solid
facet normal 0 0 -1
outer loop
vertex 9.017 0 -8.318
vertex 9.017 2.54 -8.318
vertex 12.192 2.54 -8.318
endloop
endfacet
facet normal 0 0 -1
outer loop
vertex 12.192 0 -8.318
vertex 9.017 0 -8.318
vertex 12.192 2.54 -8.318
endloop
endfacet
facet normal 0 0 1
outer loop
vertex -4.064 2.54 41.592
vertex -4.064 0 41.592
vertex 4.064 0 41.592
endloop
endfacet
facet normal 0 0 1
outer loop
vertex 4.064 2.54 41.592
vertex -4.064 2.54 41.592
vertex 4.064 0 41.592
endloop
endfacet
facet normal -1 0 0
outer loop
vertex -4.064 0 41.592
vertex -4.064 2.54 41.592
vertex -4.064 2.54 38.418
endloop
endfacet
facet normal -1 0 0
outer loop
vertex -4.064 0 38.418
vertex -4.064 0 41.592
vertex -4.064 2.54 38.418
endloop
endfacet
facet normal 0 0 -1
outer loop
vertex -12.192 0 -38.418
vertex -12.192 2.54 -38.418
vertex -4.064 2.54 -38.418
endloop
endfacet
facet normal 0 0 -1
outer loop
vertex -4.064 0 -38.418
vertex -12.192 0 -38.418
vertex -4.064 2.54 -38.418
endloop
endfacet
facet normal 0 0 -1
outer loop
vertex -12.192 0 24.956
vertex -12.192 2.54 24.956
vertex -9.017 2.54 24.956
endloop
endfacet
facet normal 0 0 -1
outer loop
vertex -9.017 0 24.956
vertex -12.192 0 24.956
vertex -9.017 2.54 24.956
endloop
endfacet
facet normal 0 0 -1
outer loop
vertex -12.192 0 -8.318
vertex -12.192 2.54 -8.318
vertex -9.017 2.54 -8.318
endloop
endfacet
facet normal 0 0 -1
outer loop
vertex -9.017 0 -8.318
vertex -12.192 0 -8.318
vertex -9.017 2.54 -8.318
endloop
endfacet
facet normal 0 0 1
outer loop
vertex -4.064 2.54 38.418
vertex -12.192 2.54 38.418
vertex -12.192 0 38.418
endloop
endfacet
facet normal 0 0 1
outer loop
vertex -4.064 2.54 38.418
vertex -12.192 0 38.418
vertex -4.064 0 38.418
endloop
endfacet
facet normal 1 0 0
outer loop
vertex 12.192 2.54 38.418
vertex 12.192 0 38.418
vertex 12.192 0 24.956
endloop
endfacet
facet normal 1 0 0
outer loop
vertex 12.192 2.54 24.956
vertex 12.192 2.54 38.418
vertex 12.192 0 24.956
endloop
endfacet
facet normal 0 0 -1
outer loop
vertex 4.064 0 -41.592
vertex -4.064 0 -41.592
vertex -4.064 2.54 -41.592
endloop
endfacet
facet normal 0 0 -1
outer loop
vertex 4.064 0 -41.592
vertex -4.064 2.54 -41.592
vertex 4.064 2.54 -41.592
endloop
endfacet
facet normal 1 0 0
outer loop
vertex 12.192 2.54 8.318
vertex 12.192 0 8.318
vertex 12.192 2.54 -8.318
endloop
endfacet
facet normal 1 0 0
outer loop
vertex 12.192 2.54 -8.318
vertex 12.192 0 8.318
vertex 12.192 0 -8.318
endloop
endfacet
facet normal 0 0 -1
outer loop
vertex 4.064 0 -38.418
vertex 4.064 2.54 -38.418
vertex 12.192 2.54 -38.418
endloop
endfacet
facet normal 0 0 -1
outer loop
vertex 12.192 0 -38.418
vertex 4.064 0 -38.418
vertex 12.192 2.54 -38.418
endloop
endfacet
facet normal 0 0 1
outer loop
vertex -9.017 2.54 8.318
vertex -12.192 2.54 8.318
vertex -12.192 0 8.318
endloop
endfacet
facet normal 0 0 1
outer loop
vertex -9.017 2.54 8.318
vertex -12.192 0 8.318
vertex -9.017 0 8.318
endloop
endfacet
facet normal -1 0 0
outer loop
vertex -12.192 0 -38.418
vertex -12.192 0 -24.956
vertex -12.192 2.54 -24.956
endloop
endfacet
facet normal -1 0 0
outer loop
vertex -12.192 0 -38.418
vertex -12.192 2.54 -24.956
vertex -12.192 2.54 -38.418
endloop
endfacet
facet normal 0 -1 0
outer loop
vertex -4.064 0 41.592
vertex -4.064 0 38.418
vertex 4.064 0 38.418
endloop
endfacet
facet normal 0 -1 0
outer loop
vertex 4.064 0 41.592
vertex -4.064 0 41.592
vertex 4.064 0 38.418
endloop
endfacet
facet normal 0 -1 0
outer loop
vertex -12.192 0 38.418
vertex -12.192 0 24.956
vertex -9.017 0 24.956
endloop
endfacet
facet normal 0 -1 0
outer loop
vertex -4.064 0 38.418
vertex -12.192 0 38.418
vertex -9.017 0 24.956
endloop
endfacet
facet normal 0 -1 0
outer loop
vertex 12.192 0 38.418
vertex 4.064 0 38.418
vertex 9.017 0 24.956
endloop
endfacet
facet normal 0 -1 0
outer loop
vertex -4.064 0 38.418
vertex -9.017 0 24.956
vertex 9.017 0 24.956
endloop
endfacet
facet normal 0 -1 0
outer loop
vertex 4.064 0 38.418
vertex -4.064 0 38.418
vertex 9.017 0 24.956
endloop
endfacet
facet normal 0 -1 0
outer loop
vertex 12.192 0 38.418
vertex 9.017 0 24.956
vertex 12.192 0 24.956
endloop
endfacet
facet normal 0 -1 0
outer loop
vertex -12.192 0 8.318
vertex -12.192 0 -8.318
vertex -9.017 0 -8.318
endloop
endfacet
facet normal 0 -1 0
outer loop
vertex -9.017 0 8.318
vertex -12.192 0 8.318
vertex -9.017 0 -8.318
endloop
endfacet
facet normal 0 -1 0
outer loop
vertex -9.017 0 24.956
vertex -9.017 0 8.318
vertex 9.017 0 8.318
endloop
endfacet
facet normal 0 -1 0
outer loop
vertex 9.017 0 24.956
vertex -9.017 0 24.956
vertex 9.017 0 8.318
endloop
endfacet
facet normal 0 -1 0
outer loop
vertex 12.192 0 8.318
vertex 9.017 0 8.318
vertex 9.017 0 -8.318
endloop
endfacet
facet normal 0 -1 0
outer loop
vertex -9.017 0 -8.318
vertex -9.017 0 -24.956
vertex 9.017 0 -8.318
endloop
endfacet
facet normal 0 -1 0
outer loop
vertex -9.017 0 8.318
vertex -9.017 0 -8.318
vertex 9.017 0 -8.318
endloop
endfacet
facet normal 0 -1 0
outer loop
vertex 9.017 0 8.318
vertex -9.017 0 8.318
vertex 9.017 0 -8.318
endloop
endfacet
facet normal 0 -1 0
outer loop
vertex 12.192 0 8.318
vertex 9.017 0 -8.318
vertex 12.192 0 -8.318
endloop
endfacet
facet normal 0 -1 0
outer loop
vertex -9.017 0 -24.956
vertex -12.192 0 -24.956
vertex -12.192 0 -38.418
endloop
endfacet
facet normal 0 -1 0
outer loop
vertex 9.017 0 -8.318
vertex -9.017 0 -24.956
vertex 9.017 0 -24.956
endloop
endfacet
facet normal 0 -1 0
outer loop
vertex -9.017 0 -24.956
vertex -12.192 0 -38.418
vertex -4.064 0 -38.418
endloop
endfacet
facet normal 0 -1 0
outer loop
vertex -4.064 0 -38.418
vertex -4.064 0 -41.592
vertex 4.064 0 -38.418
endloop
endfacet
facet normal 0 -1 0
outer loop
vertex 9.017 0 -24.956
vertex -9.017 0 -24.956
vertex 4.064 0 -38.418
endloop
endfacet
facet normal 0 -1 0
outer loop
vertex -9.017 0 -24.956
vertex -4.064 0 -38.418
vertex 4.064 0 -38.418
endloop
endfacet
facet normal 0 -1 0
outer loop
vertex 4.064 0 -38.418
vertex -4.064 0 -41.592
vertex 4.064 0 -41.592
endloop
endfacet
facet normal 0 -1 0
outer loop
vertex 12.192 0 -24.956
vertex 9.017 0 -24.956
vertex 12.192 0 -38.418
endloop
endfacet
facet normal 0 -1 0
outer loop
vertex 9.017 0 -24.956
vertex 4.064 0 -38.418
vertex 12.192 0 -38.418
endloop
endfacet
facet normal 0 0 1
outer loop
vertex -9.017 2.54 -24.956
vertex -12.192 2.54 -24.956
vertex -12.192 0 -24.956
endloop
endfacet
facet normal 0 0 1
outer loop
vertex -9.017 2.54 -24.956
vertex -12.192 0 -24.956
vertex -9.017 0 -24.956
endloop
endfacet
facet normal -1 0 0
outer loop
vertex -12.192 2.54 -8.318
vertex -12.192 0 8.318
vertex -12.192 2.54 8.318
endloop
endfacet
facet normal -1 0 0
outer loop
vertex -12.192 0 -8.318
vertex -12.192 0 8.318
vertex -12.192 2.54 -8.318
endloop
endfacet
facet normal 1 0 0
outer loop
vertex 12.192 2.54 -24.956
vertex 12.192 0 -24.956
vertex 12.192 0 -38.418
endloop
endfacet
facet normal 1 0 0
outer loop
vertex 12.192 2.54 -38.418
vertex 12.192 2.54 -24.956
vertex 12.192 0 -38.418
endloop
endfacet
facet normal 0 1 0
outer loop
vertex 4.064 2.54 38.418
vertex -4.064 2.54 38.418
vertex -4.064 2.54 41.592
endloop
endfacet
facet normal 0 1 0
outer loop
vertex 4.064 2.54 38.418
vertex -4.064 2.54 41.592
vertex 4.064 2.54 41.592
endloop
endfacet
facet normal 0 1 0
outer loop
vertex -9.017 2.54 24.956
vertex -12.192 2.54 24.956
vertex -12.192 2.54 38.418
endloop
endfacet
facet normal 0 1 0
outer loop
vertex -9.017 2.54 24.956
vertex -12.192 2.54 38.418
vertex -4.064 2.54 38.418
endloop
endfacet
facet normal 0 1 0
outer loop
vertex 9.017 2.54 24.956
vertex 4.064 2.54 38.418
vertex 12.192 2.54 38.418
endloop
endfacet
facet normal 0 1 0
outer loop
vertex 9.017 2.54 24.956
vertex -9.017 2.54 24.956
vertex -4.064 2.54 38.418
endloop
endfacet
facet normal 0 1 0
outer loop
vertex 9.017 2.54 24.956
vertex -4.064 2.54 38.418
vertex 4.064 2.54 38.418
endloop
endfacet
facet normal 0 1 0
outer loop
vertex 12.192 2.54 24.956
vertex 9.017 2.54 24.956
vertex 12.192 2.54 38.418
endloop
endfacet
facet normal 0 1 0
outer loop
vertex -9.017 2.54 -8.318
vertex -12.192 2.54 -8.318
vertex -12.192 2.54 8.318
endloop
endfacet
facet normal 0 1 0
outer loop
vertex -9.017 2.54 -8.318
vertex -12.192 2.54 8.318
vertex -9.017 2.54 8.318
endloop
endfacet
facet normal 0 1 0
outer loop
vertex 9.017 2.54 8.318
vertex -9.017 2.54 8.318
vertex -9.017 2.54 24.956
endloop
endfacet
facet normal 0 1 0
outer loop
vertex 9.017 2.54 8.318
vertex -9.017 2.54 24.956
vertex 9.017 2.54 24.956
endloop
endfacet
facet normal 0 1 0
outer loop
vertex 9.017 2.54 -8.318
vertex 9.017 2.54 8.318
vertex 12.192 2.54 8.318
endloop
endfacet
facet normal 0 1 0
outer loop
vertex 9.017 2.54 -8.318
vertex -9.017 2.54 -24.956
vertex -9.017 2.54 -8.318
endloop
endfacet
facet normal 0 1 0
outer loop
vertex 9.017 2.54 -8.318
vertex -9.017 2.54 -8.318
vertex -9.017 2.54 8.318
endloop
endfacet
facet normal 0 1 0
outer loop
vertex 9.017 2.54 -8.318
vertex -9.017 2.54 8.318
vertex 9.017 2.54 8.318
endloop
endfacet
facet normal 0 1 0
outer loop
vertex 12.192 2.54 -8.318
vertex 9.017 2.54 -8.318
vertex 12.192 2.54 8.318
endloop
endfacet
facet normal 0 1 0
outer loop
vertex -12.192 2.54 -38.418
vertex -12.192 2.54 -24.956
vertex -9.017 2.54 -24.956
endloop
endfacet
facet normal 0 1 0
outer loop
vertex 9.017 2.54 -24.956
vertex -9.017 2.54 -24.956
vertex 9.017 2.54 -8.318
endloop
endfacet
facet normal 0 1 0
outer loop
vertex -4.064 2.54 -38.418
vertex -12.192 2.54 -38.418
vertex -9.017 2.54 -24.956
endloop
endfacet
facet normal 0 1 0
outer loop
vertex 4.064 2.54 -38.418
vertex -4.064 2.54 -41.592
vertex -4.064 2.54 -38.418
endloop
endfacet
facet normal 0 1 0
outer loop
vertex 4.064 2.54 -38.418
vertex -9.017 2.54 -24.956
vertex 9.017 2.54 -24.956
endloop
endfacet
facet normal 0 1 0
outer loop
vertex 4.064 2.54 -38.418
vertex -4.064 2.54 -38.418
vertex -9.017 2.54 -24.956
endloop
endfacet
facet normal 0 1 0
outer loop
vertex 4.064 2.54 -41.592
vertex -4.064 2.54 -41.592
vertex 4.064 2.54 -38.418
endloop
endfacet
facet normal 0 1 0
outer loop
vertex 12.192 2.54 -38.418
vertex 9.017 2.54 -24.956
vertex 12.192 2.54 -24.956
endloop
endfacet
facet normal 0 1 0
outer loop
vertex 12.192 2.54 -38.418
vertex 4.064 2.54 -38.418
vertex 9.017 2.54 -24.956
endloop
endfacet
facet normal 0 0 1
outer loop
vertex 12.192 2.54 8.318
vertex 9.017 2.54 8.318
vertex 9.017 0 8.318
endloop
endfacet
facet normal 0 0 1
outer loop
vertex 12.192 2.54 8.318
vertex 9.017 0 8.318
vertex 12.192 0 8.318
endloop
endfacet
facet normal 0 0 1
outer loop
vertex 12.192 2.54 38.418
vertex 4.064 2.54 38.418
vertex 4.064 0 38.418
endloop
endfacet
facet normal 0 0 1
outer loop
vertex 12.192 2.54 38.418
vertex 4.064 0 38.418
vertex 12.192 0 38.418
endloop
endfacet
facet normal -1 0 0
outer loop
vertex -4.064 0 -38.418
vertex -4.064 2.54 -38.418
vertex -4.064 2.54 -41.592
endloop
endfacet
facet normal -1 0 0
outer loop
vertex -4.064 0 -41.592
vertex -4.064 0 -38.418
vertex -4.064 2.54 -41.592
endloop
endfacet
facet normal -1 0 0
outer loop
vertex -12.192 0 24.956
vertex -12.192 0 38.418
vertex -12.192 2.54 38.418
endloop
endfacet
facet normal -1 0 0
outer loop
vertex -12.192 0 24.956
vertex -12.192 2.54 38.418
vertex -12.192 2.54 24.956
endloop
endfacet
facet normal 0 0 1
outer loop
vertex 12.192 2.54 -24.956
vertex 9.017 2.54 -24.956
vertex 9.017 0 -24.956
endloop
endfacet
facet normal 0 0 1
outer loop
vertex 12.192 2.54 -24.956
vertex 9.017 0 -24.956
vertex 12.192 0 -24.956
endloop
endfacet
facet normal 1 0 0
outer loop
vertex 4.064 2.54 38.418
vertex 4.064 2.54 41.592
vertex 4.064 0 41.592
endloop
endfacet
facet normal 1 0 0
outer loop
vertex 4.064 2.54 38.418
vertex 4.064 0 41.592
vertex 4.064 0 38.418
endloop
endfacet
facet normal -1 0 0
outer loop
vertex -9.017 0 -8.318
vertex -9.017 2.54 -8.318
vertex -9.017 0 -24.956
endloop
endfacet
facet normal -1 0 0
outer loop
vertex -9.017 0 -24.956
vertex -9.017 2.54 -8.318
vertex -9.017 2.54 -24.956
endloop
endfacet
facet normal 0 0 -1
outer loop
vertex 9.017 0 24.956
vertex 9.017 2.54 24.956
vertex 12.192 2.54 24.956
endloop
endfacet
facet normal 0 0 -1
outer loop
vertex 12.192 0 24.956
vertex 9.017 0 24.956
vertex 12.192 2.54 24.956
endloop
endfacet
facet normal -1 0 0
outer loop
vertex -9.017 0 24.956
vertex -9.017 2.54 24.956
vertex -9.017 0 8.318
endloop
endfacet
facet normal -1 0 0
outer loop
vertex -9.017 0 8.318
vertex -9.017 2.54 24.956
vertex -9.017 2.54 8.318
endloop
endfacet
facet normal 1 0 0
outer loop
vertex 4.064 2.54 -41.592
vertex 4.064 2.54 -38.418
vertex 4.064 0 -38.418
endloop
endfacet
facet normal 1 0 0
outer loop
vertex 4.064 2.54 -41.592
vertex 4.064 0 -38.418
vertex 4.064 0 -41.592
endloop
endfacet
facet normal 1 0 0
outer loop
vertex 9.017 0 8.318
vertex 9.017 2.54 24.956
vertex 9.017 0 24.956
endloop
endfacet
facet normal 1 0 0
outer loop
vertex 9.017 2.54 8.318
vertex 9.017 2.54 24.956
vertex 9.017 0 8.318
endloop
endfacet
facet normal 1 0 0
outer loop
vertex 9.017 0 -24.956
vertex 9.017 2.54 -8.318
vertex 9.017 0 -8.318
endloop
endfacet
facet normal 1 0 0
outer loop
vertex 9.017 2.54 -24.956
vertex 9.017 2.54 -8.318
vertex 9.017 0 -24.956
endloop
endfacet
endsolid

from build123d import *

# Parameters (mm, degrees)
SKETCH1_W           = 24.384
SKETCH1_H           = 83.185
BOSS_EXTRUDE1_DEPTH = 2.54
SKETCH2_W           = 3.175
SKETCH2_H           = 16.637
CUT_EXTRUDE1_DEPTH  = 2.54
LPATTERN1_COUNT     = 2
LPATTERN1_PITCH     = 33.274
SKETCH3_W           = 8.128
SKETCH3_H           = 3.175
CUT_EXTRUDE5_DEPTH  = 3.175
LPATTERN3_COUNT     = 2
LPATTERN3_PITCH     = 16.256


with BuildPart() as part:
    # Sketch1 → Boss-Extrude1 (new body)
    with BuildSketch(Plane(origin=(0, 0, 0), x_dir=(1, 0, 0), z_dir=(0, 1, 0))):
        Rectangle(SKETCH1_W, SKETCH1_H)
    extrude(amount=BOSS_EXTRUDE1_DEPTH)

    # Sketch2 → Cut-Extrude1 (cut)
    with BuildSketch(Plane(origin=(0, 2.54, 0), x_dir=(1, 0, 0), z_dir=(0, 1, 0))):
        with Locations((-10.6045, 16.637)):
            Rectangle(SKETCH2_W, SKETCH2_H)
        with Locations((10.6045, 16.637)):
            Rectangle(SKETCH2_W, SKETCH2_H)
    cut_extrude1 = extrude(amount=-CUT_EXTRUDE1_DEPTH, mode=Mode.SUBTRACT)

    # LPattern1: Cut-Extrude1 ×2
    with Locations(*[(0, 0, i * LPATTERN1_PITCH) for i in range(1, LPATTERN1_COUNT)]):
        add(cut_extrude1, mode=Mode.SUBTRACT)

    # Sketch3 → Cut-Extrude5 (cut)
    with BuildSketch(Plane(origin=(0, 2.54, 0), x_dir=(1, 0, 0), z_dir=(0, 1, 0))):
        with Locations((8.128, 40.005)):
            Rectangle(SKETCH3_W, SKETCH3_H)
        with Locations((8.128, -40.005)):
            Rectangle(SKETCH3_W, SKETCH3_H)
    cut_extrude5 = extrude(amount=-CUT_EXTRUDE5_DEPTH, mode=Mode.SUBTRACT)

    # LPattern3: Cut-Extrude5 ×2
    with Locations(*[(-i * LPATTERN3_PITCH, 0, 0) for i in range(1, LPATTERN3_COUNT)]):
        add(cut_extrude5, mode=Mode.SUBTRACT)


solid = part.part
